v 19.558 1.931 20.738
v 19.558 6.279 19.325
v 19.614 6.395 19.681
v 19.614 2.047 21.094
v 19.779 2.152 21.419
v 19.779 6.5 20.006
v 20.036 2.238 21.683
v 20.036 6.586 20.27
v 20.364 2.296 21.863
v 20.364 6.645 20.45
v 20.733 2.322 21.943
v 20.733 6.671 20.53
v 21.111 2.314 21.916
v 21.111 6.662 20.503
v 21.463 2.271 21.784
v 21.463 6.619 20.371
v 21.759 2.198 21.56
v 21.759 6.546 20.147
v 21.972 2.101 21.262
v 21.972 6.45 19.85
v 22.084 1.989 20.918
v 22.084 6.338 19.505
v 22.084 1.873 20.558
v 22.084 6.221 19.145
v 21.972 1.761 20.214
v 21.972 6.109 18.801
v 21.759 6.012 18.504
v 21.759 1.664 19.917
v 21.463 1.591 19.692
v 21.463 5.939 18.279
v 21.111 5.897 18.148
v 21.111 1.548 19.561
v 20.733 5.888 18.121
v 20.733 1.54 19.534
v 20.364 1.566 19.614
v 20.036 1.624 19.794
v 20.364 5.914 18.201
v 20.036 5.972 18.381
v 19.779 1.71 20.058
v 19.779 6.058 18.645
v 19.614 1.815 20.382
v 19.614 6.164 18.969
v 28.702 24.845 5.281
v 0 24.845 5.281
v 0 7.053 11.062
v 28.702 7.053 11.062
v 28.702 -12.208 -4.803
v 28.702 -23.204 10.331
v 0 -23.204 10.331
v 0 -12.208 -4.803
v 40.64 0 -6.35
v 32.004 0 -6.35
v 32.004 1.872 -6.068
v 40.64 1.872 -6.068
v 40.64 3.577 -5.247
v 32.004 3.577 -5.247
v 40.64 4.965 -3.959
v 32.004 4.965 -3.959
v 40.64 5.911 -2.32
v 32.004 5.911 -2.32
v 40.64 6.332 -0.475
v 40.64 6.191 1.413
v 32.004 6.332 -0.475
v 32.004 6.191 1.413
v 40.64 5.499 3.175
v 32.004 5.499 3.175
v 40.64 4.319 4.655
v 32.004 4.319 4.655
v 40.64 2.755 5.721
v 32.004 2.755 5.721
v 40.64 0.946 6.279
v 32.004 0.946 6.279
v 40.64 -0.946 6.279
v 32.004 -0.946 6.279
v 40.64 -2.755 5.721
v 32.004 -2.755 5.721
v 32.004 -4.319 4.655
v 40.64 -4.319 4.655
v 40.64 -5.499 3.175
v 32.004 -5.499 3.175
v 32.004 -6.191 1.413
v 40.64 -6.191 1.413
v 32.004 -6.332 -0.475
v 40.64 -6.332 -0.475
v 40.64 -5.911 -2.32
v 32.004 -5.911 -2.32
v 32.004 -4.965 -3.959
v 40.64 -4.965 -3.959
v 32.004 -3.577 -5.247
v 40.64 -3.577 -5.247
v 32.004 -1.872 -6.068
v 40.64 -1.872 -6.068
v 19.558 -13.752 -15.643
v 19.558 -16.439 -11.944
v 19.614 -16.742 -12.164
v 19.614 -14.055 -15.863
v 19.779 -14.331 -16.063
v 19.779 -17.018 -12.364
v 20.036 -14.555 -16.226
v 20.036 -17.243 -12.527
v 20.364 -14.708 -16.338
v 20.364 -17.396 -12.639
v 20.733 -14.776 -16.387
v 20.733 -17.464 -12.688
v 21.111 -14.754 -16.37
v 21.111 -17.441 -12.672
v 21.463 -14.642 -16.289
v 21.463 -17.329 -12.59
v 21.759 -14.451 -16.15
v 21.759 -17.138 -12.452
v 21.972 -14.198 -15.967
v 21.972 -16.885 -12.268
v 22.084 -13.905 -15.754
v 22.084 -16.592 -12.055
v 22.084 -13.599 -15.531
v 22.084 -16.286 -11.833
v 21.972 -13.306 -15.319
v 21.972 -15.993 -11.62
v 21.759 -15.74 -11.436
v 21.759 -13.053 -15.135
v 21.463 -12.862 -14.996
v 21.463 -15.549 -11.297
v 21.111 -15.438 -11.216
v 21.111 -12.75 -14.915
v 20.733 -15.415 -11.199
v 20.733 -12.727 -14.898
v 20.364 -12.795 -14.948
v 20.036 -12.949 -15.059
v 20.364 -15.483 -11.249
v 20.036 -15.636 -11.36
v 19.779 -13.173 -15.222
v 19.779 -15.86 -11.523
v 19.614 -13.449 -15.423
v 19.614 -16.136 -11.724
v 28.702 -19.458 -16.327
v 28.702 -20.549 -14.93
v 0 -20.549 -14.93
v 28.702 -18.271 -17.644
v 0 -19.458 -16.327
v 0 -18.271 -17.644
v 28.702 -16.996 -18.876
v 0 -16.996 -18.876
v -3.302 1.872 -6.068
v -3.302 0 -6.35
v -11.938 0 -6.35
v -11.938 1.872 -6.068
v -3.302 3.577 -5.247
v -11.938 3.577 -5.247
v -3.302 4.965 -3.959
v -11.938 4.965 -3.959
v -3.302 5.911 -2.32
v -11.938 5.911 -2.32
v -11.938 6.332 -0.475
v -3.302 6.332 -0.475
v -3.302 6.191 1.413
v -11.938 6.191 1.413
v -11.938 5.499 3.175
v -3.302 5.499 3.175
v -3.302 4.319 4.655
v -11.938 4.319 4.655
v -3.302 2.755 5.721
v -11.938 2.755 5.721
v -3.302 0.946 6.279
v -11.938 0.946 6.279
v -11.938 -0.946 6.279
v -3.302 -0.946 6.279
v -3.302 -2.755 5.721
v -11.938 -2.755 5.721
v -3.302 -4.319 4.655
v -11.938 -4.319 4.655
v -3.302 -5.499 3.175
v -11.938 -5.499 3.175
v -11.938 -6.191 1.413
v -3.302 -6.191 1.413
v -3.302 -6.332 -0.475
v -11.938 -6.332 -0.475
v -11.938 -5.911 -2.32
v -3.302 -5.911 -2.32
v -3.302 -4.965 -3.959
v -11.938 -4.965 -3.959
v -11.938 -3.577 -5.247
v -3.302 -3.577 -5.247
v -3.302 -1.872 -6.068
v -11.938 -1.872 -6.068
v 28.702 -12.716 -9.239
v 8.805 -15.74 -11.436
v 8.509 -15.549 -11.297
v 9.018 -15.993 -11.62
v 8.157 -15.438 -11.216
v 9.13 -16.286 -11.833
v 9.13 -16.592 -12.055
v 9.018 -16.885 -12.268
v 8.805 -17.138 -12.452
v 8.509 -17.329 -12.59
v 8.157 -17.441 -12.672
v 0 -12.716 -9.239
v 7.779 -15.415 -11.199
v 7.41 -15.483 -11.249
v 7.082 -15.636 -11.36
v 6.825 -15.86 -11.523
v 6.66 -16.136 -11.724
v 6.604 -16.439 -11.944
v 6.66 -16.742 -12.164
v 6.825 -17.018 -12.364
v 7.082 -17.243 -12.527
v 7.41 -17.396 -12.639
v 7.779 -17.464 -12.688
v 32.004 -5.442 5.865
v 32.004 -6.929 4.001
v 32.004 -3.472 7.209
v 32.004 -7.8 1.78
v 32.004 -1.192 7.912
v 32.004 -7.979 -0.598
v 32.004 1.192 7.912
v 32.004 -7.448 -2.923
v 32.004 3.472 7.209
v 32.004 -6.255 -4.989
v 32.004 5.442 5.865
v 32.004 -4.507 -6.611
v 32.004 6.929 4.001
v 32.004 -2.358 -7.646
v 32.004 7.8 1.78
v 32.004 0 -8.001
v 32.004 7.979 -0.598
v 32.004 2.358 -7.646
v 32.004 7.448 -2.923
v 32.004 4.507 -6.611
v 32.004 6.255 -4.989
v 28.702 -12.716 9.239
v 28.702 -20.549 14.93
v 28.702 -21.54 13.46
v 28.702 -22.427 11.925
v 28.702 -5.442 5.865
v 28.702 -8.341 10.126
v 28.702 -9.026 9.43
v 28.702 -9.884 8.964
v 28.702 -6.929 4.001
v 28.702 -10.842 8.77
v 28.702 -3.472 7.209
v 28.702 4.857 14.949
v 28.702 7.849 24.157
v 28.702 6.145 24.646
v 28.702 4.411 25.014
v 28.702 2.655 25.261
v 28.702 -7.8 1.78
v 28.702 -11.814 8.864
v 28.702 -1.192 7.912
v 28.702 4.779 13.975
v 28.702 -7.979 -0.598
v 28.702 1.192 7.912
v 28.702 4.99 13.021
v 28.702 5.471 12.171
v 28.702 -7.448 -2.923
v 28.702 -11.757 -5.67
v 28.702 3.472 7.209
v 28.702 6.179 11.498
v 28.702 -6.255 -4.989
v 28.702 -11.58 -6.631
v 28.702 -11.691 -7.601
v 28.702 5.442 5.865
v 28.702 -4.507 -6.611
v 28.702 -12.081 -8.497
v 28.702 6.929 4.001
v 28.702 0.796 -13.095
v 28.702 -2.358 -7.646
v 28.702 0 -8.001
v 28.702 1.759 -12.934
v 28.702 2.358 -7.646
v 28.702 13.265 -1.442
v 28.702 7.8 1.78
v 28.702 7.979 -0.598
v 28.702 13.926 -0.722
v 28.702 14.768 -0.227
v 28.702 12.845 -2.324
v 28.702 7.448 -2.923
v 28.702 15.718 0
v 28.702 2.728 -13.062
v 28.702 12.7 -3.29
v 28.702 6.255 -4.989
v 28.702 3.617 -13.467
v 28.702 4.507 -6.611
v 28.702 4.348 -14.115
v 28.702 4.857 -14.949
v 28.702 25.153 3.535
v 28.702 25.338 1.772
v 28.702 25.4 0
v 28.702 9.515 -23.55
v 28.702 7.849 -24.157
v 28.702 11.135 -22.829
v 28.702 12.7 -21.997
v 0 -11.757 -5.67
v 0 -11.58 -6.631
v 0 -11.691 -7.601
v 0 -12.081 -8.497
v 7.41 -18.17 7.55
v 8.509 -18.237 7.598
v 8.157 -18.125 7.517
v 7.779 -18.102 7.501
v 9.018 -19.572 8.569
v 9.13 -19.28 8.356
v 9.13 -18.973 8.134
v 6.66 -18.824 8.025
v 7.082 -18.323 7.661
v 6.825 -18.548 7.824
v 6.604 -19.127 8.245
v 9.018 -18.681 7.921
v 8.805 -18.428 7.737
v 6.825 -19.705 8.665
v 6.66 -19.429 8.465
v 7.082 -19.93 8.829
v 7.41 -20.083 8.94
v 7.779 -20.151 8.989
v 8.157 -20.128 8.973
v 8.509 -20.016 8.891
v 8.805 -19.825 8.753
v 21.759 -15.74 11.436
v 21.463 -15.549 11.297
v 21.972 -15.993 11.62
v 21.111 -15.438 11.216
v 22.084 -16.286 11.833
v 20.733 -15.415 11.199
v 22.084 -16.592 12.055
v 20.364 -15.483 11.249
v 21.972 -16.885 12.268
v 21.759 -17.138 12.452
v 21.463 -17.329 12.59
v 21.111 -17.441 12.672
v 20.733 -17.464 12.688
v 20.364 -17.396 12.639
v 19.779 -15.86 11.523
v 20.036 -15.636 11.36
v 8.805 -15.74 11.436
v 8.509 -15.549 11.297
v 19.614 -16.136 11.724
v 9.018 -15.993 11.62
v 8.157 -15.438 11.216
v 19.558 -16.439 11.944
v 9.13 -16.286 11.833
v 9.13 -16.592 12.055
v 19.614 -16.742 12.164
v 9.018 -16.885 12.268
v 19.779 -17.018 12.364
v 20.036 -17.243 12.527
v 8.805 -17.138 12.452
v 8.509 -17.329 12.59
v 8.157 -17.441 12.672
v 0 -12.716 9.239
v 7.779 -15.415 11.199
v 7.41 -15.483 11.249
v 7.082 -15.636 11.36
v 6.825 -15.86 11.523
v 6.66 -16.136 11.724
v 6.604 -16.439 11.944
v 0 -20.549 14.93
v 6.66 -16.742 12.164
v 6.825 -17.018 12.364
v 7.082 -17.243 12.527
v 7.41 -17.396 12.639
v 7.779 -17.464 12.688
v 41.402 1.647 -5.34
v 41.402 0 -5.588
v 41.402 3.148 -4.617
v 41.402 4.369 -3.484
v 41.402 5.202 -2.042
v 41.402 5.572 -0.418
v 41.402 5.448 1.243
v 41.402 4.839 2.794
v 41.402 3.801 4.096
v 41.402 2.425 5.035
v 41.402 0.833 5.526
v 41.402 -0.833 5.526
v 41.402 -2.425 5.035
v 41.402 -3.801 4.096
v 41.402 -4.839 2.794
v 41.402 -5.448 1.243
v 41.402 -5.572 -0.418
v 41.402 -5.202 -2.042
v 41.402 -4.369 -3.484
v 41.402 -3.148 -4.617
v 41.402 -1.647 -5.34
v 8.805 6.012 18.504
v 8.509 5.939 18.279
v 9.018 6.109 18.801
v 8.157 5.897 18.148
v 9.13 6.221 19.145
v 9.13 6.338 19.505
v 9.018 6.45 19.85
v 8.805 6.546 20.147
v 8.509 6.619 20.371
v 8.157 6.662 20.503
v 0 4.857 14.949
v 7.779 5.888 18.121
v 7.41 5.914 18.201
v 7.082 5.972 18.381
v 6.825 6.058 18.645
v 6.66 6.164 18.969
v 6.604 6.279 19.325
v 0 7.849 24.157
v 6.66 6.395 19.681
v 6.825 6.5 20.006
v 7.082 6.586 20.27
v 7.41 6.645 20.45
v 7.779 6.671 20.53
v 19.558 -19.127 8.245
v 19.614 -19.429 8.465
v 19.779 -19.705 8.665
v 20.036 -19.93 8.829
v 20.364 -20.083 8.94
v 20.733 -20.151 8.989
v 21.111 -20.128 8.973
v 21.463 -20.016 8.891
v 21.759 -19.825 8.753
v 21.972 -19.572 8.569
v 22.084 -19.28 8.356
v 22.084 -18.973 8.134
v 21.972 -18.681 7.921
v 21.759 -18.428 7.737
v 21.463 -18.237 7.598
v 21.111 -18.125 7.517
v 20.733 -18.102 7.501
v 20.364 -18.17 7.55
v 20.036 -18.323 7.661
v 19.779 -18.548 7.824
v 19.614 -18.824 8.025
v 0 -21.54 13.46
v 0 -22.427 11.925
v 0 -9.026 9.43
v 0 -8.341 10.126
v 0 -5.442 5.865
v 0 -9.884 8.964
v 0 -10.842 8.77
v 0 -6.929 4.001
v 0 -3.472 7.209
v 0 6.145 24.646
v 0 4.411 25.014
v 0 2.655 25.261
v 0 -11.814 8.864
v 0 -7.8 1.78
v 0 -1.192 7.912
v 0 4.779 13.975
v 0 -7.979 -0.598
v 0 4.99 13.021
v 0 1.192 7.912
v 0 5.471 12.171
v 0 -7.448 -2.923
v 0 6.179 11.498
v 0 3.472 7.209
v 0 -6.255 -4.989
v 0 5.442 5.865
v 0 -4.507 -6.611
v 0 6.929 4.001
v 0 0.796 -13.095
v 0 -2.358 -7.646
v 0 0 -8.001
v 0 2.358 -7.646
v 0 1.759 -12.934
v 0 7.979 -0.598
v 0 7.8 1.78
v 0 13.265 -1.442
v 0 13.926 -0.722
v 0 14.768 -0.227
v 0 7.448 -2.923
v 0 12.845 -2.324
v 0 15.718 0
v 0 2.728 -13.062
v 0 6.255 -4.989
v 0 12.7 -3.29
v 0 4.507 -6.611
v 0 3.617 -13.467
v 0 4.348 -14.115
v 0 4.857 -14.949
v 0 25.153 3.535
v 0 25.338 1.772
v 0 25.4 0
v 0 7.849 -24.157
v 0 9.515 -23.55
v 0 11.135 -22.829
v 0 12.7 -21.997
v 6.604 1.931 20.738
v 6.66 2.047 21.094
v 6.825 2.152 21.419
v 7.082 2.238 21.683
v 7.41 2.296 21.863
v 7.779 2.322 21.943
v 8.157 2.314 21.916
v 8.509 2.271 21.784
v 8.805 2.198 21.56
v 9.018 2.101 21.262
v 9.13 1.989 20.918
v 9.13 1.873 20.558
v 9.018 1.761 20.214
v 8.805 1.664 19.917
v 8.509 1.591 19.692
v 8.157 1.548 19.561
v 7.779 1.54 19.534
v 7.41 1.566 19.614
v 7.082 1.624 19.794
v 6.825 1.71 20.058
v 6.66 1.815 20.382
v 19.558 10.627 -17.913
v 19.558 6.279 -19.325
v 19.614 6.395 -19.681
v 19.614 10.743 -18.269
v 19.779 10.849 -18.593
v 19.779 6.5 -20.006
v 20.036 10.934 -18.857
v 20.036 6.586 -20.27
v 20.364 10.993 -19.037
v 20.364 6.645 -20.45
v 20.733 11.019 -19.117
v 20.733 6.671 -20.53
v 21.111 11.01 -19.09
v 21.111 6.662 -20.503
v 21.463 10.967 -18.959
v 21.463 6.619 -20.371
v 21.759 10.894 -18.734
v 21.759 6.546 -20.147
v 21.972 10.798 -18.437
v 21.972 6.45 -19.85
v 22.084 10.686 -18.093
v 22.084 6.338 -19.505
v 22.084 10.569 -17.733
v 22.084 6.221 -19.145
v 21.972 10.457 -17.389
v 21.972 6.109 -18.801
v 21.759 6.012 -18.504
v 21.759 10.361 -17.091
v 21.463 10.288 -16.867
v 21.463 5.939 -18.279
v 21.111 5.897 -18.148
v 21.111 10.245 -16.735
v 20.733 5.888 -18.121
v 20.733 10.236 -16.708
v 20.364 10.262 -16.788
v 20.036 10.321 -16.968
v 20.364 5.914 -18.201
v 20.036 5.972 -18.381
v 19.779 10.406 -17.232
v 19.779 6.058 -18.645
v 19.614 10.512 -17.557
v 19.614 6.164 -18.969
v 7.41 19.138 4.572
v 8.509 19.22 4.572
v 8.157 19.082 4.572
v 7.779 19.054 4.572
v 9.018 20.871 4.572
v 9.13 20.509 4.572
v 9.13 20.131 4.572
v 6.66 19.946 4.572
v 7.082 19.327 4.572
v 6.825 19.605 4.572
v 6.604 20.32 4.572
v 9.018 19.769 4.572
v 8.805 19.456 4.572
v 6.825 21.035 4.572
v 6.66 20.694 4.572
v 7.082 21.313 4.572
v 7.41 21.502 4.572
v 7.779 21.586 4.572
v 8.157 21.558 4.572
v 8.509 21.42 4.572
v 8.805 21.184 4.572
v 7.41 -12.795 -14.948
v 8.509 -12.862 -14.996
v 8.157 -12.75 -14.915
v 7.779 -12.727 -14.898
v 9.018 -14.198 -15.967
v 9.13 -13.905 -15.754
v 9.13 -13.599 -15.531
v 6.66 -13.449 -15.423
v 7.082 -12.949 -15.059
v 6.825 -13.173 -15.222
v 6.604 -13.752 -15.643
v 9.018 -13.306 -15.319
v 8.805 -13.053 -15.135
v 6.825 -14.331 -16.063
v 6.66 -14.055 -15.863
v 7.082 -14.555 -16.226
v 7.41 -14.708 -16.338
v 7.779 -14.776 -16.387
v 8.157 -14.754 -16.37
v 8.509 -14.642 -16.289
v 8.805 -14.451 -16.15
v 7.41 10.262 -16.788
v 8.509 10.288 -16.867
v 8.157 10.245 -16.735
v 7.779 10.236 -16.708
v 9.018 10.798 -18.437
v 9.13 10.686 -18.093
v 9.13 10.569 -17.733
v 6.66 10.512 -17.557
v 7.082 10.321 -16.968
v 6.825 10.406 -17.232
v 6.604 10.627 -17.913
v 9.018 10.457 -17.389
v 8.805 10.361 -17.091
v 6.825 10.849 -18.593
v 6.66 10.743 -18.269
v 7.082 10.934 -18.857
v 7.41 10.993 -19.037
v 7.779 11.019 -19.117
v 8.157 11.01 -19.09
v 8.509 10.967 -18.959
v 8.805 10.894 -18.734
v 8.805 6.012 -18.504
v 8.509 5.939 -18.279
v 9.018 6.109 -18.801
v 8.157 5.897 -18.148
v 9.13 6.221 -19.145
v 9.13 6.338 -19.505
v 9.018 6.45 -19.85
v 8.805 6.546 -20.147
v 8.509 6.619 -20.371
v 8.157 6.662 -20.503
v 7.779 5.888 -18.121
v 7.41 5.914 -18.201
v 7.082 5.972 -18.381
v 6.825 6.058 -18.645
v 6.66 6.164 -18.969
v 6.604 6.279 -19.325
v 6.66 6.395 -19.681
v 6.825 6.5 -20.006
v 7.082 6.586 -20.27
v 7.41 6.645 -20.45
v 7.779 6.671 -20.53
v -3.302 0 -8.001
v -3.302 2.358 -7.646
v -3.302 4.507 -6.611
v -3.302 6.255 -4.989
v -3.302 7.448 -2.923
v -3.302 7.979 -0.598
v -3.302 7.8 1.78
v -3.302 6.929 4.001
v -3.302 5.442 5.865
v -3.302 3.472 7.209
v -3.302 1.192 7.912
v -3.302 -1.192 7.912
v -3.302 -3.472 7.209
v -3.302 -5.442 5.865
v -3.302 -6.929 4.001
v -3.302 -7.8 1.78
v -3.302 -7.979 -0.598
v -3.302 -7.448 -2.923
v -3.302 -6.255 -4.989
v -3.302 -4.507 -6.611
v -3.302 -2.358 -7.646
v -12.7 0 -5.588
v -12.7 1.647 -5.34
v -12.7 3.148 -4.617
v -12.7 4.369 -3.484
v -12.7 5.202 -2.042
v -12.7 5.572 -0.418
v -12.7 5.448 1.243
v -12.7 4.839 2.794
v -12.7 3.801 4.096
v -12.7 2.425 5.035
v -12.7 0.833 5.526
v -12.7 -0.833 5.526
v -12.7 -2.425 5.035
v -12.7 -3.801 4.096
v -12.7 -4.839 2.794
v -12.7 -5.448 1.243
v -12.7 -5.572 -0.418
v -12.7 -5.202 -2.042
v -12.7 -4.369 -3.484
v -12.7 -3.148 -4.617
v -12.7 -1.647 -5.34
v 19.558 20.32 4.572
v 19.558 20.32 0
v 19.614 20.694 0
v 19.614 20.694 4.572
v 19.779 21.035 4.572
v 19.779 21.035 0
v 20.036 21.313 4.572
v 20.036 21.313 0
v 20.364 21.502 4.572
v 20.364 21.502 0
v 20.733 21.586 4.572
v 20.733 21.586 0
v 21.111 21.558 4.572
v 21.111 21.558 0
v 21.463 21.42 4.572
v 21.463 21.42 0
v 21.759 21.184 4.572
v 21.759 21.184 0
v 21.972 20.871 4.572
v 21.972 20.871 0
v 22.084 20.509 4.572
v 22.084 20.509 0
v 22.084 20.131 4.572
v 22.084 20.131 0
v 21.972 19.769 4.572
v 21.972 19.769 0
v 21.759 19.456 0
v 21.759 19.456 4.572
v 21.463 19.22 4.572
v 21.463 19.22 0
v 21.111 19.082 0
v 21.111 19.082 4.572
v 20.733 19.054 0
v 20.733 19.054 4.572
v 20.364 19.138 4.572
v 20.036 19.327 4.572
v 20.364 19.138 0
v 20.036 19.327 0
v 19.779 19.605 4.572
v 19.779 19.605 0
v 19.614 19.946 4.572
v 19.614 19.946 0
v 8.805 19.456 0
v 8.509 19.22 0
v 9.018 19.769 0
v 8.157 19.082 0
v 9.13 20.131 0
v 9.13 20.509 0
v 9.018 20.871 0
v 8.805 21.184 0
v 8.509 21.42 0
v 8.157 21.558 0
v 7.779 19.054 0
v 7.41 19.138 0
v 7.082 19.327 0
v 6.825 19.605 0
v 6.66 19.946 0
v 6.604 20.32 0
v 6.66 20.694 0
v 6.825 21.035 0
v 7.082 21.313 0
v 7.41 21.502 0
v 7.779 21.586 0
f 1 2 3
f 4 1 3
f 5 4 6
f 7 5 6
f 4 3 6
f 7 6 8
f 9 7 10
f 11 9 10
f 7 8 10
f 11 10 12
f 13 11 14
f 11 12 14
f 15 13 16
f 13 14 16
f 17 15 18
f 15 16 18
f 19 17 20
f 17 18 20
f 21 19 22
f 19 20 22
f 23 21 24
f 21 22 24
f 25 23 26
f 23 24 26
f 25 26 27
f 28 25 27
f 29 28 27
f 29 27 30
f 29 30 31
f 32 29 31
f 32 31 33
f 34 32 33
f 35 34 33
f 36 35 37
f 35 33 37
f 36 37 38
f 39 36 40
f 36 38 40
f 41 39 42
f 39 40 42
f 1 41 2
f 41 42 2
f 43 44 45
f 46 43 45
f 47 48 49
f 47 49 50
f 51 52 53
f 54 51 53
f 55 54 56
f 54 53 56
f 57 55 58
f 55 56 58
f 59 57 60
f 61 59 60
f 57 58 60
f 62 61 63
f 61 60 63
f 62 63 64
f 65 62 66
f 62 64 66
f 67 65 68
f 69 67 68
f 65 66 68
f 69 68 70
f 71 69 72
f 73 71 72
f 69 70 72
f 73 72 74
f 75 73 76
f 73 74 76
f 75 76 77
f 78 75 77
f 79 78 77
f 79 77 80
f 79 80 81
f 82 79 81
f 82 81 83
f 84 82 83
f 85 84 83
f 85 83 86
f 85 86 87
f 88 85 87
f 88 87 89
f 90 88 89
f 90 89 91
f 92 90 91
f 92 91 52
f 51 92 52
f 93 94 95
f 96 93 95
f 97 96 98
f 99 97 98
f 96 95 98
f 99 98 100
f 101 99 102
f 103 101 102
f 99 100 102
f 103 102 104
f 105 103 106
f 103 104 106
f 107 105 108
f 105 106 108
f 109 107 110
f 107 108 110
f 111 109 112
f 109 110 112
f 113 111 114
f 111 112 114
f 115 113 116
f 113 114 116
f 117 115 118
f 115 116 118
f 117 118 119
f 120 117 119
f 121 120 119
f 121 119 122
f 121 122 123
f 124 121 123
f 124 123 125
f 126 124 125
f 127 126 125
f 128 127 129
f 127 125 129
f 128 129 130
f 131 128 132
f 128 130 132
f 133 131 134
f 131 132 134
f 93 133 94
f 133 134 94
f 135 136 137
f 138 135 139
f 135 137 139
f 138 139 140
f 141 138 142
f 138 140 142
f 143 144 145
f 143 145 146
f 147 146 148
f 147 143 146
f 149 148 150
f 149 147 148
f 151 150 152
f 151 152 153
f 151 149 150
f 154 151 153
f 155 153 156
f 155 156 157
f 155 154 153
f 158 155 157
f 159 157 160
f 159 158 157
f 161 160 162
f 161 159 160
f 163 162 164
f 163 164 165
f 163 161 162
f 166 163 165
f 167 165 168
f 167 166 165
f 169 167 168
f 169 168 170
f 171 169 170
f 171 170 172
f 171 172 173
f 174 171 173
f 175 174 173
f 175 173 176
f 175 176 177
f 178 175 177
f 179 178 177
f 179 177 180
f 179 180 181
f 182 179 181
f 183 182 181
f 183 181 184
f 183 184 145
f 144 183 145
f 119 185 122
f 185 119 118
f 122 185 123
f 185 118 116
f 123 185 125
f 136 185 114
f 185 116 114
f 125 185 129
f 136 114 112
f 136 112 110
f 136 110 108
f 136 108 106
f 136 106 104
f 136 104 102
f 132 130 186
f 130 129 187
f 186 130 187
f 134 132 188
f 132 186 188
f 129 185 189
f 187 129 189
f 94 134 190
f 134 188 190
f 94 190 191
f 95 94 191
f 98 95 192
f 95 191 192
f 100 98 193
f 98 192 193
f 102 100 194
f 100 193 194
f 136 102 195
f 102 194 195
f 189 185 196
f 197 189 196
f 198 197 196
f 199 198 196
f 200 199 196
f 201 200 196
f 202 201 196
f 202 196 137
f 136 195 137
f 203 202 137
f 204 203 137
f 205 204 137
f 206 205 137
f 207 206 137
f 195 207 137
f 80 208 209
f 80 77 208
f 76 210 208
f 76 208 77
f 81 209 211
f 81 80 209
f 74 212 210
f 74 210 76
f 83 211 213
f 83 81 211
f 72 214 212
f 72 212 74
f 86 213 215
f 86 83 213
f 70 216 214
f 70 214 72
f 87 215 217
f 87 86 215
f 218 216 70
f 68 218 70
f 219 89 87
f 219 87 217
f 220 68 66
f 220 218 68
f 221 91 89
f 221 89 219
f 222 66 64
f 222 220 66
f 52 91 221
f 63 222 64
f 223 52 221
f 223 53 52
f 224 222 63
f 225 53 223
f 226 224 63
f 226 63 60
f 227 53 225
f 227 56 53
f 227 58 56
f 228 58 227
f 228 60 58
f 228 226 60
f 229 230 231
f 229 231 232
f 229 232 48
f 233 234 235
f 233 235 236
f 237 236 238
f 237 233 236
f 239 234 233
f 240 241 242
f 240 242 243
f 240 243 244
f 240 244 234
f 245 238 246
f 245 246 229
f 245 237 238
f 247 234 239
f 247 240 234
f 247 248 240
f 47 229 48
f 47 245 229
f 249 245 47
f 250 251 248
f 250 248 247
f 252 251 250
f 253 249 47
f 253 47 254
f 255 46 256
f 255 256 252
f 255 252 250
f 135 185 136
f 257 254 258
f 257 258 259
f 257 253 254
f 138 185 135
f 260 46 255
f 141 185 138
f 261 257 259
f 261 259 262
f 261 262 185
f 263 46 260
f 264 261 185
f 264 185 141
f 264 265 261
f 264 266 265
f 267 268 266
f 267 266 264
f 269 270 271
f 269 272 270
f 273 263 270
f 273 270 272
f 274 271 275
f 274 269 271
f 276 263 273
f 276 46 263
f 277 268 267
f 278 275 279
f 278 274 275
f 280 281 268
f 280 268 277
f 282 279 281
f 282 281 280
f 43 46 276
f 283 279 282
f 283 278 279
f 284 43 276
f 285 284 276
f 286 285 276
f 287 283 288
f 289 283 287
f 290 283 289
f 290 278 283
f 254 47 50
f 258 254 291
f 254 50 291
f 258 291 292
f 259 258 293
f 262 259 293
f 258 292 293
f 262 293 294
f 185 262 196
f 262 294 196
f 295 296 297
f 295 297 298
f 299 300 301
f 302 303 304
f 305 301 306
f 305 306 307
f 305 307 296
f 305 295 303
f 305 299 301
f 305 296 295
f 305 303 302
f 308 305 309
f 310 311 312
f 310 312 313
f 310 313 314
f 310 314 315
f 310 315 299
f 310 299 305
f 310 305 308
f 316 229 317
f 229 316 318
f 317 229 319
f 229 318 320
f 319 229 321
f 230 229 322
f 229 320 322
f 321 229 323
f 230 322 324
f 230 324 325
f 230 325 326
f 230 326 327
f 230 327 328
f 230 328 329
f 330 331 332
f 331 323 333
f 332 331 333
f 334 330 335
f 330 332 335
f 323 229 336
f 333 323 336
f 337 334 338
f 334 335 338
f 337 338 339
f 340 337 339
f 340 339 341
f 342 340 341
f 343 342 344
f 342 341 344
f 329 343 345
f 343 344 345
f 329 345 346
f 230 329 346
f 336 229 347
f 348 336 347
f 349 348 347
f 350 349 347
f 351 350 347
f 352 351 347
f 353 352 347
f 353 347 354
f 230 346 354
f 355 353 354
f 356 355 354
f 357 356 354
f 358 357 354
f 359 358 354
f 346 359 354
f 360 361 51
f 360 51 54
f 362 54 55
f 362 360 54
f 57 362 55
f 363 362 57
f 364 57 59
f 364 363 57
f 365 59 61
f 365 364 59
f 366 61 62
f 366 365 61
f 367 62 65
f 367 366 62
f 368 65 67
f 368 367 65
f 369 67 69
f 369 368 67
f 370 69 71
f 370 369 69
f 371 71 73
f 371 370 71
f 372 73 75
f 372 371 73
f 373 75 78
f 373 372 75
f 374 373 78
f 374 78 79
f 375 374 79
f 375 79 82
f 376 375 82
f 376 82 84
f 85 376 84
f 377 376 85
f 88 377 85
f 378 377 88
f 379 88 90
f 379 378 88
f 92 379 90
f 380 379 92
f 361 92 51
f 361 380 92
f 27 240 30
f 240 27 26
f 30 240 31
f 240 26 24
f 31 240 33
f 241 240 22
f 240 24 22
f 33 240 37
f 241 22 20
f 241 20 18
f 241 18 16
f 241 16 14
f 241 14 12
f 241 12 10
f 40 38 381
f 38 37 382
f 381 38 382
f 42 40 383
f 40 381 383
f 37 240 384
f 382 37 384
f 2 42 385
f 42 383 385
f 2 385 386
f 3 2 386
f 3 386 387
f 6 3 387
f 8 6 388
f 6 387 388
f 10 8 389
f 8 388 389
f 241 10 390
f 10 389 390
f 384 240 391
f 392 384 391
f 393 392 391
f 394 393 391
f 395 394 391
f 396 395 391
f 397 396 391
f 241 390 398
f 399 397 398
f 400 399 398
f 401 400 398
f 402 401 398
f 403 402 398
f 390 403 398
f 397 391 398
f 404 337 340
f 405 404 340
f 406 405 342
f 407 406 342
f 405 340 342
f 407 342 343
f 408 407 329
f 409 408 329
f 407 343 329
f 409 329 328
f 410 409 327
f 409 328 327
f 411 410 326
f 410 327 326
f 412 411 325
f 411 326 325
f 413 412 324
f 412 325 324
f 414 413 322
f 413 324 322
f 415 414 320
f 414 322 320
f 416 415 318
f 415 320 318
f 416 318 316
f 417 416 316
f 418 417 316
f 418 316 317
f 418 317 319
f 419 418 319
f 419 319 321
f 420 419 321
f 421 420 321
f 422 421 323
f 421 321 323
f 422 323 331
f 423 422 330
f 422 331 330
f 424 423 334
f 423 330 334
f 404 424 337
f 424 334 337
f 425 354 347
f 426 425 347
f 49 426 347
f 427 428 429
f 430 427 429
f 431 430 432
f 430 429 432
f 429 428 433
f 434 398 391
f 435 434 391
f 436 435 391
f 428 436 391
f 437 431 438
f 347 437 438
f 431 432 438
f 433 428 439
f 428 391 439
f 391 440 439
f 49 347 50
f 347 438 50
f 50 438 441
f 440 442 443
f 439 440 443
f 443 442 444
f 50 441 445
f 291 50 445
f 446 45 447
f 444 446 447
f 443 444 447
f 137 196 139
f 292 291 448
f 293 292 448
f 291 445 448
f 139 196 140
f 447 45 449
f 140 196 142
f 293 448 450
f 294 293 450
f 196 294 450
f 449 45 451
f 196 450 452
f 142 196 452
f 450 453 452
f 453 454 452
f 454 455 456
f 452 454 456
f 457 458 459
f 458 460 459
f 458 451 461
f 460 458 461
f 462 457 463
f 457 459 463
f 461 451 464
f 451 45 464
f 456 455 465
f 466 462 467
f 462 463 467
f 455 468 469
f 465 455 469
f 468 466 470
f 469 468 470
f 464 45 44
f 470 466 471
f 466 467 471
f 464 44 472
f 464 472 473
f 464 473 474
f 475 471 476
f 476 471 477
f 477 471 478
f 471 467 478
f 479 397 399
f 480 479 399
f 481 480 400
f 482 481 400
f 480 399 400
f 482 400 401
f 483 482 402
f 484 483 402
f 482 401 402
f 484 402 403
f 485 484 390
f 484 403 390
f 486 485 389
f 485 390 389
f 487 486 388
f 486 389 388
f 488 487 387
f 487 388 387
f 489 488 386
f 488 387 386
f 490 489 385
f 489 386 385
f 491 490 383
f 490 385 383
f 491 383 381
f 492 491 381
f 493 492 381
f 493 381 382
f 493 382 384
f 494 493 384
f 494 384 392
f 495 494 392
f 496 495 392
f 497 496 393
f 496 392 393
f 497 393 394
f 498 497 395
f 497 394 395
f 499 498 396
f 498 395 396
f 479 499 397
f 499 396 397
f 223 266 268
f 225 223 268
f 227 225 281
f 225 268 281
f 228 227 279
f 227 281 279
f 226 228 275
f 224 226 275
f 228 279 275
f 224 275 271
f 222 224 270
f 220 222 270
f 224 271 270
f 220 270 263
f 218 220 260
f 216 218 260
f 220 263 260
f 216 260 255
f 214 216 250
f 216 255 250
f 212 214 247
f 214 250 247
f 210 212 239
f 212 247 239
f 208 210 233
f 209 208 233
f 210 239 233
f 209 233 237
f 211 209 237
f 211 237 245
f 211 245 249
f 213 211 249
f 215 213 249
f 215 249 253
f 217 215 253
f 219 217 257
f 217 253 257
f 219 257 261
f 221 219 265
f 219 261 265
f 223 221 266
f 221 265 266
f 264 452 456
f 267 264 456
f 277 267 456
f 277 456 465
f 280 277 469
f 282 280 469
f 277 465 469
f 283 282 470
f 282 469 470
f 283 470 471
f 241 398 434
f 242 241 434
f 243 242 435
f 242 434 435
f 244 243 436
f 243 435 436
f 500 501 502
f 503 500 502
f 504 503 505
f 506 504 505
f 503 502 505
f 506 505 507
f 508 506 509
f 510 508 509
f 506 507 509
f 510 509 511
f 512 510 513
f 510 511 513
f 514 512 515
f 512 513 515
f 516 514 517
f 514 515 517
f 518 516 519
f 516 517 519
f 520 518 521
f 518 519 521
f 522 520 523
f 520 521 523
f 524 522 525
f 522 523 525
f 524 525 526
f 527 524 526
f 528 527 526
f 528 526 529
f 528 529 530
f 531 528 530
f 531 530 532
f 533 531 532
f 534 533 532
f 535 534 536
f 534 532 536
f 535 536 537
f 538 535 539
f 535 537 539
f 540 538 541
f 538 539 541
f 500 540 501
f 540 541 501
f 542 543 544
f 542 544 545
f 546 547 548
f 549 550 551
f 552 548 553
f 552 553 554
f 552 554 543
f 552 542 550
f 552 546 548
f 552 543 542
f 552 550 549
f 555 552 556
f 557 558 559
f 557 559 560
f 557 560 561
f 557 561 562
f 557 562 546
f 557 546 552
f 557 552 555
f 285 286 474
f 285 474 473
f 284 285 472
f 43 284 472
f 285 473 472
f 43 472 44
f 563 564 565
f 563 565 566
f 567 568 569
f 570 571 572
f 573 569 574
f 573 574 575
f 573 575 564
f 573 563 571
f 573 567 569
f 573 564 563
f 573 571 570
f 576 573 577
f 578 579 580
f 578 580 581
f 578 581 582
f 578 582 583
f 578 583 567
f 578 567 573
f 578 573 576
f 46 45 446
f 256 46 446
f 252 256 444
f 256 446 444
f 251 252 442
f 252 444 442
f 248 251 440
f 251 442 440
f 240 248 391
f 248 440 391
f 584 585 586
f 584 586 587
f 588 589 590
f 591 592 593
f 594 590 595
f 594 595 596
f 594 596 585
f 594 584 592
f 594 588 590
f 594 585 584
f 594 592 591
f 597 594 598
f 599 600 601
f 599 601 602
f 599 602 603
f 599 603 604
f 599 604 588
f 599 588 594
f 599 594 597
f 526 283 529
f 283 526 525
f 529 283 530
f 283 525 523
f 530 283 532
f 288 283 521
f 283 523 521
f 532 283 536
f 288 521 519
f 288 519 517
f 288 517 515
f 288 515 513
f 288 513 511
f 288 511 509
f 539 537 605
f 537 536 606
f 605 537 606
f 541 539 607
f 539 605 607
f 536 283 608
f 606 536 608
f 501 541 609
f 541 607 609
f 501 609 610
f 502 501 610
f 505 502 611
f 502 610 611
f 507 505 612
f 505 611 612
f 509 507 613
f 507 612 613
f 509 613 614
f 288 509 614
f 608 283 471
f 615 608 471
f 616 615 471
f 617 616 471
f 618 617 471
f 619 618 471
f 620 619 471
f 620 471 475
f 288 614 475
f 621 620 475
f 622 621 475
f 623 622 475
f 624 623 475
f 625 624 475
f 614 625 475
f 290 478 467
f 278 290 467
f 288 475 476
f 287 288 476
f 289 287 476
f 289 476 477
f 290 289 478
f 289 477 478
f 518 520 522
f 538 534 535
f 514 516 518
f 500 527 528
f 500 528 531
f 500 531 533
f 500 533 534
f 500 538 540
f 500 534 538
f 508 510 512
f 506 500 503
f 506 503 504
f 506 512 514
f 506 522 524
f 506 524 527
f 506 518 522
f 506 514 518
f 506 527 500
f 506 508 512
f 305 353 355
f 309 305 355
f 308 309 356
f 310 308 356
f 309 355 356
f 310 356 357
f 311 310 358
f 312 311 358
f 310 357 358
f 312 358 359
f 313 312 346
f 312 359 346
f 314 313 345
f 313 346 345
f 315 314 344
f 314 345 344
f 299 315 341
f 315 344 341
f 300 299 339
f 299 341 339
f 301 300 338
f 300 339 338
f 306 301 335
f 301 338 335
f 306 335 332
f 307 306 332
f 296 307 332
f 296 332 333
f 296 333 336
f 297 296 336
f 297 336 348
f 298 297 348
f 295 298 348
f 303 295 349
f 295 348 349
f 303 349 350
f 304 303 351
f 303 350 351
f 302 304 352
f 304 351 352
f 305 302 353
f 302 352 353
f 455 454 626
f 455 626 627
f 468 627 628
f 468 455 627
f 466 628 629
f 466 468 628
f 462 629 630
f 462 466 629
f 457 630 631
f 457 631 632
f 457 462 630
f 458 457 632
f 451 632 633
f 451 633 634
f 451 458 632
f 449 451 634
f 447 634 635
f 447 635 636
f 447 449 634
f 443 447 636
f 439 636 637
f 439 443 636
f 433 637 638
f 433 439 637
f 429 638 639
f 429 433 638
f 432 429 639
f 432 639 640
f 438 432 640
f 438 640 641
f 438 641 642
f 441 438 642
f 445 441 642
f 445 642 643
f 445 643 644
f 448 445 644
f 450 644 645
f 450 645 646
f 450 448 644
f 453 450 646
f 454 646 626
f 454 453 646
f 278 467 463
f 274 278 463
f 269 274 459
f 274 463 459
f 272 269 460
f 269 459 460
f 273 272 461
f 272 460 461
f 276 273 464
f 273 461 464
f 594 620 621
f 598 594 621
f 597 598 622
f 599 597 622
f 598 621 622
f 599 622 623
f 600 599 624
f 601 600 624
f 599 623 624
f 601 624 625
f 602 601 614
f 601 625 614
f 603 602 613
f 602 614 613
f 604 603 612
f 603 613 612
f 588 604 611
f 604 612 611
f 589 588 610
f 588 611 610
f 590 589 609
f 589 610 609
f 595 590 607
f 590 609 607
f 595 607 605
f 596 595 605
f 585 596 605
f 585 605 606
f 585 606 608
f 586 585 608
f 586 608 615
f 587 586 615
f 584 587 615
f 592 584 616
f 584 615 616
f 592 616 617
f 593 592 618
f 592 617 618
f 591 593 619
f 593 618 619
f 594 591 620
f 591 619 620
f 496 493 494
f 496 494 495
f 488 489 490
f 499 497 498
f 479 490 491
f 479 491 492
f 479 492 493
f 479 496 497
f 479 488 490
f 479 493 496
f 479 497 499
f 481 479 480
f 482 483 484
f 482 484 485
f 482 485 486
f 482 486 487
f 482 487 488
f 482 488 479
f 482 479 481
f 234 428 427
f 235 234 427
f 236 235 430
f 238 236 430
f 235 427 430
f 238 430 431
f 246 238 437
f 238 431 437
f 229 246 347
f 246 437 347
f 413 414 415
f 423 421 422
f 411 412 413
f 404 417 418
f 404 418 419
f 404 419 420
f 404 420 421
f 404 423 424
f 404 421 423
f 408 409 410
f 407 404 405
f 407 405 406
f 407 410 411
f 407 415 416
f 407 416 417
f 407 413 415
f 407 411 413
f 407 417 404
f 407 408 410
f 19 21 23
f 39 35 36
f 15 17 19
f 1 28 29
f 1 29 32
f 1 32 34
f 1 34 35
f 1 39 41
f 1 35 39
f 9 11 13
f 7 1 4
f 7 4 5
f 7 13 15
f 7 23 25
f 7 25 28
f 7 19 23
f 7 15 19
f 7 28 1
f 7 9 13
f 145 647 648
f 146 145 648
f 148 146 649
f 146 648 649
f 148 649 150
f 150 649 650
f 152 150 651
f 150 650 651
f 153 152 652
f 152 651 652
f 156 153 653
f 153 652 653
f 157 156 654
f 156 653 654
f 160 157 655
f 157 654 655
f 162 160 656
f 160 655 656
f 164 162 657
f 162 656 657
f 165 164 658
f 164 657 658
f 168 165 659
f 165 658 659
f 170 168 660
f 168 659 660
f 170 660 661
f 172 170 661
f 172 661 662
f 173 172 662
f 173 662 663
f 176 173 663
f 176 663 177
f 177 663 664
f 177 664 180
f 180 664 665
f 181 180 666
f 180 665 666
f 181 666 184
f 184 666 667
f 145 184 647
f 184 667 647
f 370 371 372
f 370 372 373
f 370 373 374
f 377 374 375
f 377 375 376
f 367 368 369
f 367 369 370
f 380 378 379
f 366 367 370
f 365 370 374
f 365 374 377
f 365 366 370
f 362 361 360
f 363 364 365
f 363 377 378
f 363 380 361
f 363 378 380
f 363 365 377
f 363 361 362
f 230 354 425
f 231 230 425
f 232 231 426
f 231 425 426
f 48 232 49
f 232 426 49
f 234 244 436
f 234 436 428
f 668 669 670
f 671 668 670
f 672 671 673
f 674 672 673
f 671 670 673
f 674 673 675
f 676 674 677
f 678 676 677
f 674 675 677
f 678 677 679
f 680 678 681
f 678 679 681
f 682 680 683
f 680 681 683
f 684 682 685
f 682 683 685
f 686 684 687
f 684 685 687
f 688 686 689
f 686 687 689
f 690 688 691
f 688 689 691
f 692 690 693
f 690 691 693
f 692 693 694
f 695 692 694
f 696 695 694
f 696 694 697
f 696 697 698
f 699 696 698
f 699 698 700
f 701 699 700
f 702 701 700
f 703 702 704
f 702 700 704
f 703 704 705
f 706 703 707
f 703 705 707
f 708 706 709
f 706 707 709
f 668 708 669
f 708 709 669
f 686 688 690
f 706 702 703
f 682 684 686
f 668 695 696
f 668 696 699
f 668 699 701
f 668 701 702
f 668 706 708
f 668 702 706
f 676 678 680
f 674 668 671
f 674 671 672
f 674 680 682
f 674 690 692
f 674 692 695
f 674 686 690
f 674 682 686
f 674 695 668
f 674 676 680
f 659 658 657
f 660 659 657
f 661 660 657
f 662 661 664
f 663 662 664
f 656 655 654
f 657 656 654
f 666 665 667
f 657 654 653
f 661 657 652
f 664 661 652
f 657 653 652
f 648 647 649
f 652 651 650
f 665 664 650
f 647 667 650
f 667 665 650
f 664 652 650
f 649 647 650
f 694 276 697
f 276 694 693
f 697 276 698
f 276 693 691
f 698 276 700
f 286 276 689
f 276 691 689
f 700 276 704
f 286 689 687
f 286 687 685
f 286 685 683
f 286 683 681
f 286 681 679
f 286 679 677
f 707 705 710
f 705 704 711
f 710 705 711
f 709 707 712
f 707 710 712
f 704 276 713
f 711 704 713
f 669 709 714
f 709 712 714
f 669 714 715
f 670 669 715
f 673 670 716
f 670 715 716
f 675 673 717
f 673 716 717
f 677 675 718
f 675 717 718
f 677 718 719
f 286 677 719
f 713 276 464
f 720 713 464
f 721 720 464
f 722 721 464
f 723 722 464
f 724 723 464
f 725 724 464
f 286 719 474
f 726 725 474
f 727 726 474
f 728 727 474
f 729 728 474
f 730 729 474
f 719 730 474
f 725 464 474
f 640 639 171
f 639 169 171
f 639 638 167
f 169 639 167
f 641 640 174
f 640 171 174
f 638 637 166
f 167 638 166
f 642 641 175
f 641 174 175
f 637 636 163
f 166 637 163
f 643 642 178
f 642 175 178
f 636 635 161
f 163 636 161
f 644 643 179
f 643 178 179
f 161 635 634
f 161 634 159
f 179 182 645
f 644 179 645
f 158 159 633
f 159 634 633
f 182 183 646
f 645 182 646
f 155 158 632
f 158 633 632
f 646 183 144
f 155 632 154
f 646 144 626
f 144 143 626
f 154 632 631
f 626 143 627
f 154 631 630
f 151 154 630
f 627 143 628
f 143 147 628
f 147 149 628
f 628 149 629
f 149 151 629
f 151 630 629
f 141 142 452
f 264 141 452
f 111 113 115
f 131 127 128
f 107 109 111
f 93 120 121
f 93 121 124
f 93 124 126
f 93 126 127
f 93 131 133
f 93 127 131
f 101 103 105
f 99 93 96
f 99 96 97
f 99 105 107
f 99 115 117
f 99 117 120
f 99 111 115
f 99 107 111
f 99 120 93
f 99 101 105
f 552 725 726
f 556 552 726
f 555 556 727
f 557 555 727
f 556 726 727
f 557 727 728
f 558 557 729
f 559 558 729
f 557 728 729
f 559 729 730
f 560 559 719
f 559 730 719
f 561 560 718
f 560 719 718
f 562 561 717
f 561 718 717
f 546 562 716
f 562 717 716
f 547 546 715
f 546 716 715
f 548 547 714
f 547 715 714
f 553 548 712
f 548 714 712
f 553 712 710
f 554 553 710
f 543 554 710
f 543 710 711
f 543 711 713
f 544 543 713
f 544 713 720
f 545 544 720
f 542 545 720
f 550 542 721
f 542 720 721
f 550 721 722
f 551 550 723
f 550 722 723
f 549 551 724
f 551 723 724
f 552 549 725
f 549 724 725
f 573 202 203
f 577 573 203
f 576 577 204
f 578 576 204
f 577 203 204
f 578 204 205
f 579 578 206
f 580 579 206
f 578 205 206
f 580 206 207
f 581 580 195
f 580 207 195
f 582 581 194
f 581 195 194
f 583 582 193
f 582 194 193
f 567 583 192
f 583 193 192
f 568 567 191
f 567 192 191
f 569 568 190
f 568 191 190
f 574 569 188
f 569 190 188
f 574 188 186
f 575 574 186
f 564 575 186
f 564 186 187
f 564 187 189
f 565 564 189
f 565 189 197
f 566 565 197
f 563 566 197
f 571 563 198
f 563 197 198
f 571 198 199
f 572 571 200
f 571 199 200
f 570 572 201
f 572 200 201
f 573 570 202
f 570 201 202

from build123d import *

# Parameters (mm, degrees)
BOSS_EXTRUDE1_DEPTH      = 28.702
SKETCH9_R                = 8.001
SKETCH9_R_2              = 6.35
BOSS_EXTRUDE2_DEPTH      = 3.302
SKETCH16_R               = 6.35
BOSS_EXTRUDE3_DEPTH      = 12.7
CHAMFER1_SIZE            = 0.762
CHAMFER1_OF_MIRROR1_SIZE = 0.762
SKETCH17_R               = 1.27
CUT_EXTRUDE1_DEPTH       = 4.572
CIRPATTERN1_COUNT        = 5


with BuildPart() as part:
    # Sketch1 → Boss-Extrude1 (new body)
    with BuildSketch(Plane(origin=(0, 0, 0), x_dir=(0, 0, -1), z_dir=(1, 0, 0))):
        with BuildLine():
            Line((0, 15.718274541), (0, 25.4))
            ThreePointArc((0, 25.4), (-2.655022967, 25.260856142), (-5.280956947, 24.844949059))
            Line((-5.280956947, 24.844949059), (-11.061817414, 7.053289967))
            ThreePointArc((-11.061817414, 7.053289967), (-12.577998446, 5.198746045), (-14.948967427, 4.857213955))
            Line((-14.948967427, 4.857213955), (-24.156835514, 7.849031657))
            ThreePointArc((-24.156835514, 7.849031657), (-24.844949059, 5.280956947), (-25.260856142, 2.655022967))
            Line((-25.260856142, 2.655022967), (-10.126366954, -8.340827068))
            ThreePointArc((-10.126366954, -8.340827068), (-8.831116578, -10.355886507), (-9.238969967, -12.716351226))
            Line((-9.238969967, -12.716351226), (-14.929745408, -20.549031657))
            ThreePointArc((-14.929745408, -20.549031657), (-12.7, -21.997045256), (-10.331110734, -23.204054624))
            Line((-10.331110734, -23.204054624), (4.803378454, -12.208204589))
            ThreePointArc((4.803378454, -12.208204589), (7.120068242, -11.59903589), (9.238969967, -12.716351226))
            Line((9.238969967, -12.716351226), (14.929745408, -20.549031657))
            ThreePointArc((14.929745408, -20.549031657), (16.995917402, -18.875878567), (18.875878567, -16.995917402))
            Line((18.875878567, -16.995917402), (13.095018099, 0.79574169))
            ThreePointArc((13.095018099, 0.79574169), (13.231560754, 3.18728809), (14.948967427, 4.857213955))
            Line((14.948967427, 4.857213955), (24.156835514, 7.849031657))
            ThreePointArc((24.156835514, 7.849031657), (23.204054624, 10.331110734), (21.997045256, 12.7))
            Line((21.997045256, 12.7), (3.289787814, 12.7))
            ThreePointArc((3.289787814, 12.7), (1.057486028, 13.568888261), (0, 15.718274541))
        make_face()
    extrude(amount=BOSS_EXTRUDE1_DEPTH)

    # Sketch9 → Boss-Extrude2 (add)
    with BuildSketch(Plane(origin=(28.702, 0, 0), x_dir=(0, 0, -1), z_dir=(1, 0, 0))):
        Circle(SKETCH9_R)
        Circle(SKETCH9_R_2, mode=Mode.SUBTRACT)
    boss_extrude2 = extrude(amount=BOSS_EXTRUDE2_DEPTH)

    # Sketch16 → Boss-Extrude3 (add)
    with BuildSketch(Plane(origin=(28.702, 0, 0), x_dir=(0, 0, -1), z_dir=(1, 0, 0))):
        Circle(SKETCH16_R)
    boss_extrude3 = extrude(amount=BOSS_EXTRUDE3_DEPTH)

    # Chamfer1
    chamfer1_edges = [part.edges().sort_by_distance(p)[0] for p in [
        (41.402, 0, 6.35),
    ]]
    chamfer(chamfer1_edges, length=CHAMFER1_SIZE)

    # Mirror1: Boss-Extrude2, Boss-Extrude3 across plane
    add(boss_extrude2.mirror(Plane(origin=(14.351, 0, 0), x_dir=(0, 0, 1), z_dir=(1, 0, 0))))
    add(boss_extrude3.mirror(Plane(origin=(14.351, 0, 0), x_dir=(0, 0, 1), z_dir=(1, 0, 0))))

    # Chamfer1 of Mirror1
    chamfer1_of_mirror1_edges = [part.edges().sort_by_distance(p)[0] for p in [
        (-12.7, 0, 6.35),
    ]]
    chamfer(chamfer1_of_mirror1_edges, length=CHAMFER1_OF_MIRROR1_SIZE)

    # Sketch17 → Cut-Extrude1 (cut)
    with BuildSketch(Plane(origin=(0, 0, 0), x_dir=(-1, 0, 0), z_dir=(0, 0, -1))):
        with Locations((-20.828, 20.32)):
            Circle(SKETCH17_R)
        with Locations((-7.874, 20.32)):
            Circle(SKETCH17_R)
    cut_extrude1 = extrude(amount=-CUT_EXTRUDE1_DEPTH, mode=Mode.SUBTRACT)

    # CirPattern1: Cut-Extrude1 ×5 about axis
    cirpattern1_axis = Axis((0, 0, 0), (1, 0, 0))
    for i in range(1, CIRPATTERN1_COUNT):
        add(cut_extrude1.rotate(cirpattern1_axis, i * 360 / CIRPATTERN1_COUNT), mode=Mode.SUBTRACT)


solid = part.part
